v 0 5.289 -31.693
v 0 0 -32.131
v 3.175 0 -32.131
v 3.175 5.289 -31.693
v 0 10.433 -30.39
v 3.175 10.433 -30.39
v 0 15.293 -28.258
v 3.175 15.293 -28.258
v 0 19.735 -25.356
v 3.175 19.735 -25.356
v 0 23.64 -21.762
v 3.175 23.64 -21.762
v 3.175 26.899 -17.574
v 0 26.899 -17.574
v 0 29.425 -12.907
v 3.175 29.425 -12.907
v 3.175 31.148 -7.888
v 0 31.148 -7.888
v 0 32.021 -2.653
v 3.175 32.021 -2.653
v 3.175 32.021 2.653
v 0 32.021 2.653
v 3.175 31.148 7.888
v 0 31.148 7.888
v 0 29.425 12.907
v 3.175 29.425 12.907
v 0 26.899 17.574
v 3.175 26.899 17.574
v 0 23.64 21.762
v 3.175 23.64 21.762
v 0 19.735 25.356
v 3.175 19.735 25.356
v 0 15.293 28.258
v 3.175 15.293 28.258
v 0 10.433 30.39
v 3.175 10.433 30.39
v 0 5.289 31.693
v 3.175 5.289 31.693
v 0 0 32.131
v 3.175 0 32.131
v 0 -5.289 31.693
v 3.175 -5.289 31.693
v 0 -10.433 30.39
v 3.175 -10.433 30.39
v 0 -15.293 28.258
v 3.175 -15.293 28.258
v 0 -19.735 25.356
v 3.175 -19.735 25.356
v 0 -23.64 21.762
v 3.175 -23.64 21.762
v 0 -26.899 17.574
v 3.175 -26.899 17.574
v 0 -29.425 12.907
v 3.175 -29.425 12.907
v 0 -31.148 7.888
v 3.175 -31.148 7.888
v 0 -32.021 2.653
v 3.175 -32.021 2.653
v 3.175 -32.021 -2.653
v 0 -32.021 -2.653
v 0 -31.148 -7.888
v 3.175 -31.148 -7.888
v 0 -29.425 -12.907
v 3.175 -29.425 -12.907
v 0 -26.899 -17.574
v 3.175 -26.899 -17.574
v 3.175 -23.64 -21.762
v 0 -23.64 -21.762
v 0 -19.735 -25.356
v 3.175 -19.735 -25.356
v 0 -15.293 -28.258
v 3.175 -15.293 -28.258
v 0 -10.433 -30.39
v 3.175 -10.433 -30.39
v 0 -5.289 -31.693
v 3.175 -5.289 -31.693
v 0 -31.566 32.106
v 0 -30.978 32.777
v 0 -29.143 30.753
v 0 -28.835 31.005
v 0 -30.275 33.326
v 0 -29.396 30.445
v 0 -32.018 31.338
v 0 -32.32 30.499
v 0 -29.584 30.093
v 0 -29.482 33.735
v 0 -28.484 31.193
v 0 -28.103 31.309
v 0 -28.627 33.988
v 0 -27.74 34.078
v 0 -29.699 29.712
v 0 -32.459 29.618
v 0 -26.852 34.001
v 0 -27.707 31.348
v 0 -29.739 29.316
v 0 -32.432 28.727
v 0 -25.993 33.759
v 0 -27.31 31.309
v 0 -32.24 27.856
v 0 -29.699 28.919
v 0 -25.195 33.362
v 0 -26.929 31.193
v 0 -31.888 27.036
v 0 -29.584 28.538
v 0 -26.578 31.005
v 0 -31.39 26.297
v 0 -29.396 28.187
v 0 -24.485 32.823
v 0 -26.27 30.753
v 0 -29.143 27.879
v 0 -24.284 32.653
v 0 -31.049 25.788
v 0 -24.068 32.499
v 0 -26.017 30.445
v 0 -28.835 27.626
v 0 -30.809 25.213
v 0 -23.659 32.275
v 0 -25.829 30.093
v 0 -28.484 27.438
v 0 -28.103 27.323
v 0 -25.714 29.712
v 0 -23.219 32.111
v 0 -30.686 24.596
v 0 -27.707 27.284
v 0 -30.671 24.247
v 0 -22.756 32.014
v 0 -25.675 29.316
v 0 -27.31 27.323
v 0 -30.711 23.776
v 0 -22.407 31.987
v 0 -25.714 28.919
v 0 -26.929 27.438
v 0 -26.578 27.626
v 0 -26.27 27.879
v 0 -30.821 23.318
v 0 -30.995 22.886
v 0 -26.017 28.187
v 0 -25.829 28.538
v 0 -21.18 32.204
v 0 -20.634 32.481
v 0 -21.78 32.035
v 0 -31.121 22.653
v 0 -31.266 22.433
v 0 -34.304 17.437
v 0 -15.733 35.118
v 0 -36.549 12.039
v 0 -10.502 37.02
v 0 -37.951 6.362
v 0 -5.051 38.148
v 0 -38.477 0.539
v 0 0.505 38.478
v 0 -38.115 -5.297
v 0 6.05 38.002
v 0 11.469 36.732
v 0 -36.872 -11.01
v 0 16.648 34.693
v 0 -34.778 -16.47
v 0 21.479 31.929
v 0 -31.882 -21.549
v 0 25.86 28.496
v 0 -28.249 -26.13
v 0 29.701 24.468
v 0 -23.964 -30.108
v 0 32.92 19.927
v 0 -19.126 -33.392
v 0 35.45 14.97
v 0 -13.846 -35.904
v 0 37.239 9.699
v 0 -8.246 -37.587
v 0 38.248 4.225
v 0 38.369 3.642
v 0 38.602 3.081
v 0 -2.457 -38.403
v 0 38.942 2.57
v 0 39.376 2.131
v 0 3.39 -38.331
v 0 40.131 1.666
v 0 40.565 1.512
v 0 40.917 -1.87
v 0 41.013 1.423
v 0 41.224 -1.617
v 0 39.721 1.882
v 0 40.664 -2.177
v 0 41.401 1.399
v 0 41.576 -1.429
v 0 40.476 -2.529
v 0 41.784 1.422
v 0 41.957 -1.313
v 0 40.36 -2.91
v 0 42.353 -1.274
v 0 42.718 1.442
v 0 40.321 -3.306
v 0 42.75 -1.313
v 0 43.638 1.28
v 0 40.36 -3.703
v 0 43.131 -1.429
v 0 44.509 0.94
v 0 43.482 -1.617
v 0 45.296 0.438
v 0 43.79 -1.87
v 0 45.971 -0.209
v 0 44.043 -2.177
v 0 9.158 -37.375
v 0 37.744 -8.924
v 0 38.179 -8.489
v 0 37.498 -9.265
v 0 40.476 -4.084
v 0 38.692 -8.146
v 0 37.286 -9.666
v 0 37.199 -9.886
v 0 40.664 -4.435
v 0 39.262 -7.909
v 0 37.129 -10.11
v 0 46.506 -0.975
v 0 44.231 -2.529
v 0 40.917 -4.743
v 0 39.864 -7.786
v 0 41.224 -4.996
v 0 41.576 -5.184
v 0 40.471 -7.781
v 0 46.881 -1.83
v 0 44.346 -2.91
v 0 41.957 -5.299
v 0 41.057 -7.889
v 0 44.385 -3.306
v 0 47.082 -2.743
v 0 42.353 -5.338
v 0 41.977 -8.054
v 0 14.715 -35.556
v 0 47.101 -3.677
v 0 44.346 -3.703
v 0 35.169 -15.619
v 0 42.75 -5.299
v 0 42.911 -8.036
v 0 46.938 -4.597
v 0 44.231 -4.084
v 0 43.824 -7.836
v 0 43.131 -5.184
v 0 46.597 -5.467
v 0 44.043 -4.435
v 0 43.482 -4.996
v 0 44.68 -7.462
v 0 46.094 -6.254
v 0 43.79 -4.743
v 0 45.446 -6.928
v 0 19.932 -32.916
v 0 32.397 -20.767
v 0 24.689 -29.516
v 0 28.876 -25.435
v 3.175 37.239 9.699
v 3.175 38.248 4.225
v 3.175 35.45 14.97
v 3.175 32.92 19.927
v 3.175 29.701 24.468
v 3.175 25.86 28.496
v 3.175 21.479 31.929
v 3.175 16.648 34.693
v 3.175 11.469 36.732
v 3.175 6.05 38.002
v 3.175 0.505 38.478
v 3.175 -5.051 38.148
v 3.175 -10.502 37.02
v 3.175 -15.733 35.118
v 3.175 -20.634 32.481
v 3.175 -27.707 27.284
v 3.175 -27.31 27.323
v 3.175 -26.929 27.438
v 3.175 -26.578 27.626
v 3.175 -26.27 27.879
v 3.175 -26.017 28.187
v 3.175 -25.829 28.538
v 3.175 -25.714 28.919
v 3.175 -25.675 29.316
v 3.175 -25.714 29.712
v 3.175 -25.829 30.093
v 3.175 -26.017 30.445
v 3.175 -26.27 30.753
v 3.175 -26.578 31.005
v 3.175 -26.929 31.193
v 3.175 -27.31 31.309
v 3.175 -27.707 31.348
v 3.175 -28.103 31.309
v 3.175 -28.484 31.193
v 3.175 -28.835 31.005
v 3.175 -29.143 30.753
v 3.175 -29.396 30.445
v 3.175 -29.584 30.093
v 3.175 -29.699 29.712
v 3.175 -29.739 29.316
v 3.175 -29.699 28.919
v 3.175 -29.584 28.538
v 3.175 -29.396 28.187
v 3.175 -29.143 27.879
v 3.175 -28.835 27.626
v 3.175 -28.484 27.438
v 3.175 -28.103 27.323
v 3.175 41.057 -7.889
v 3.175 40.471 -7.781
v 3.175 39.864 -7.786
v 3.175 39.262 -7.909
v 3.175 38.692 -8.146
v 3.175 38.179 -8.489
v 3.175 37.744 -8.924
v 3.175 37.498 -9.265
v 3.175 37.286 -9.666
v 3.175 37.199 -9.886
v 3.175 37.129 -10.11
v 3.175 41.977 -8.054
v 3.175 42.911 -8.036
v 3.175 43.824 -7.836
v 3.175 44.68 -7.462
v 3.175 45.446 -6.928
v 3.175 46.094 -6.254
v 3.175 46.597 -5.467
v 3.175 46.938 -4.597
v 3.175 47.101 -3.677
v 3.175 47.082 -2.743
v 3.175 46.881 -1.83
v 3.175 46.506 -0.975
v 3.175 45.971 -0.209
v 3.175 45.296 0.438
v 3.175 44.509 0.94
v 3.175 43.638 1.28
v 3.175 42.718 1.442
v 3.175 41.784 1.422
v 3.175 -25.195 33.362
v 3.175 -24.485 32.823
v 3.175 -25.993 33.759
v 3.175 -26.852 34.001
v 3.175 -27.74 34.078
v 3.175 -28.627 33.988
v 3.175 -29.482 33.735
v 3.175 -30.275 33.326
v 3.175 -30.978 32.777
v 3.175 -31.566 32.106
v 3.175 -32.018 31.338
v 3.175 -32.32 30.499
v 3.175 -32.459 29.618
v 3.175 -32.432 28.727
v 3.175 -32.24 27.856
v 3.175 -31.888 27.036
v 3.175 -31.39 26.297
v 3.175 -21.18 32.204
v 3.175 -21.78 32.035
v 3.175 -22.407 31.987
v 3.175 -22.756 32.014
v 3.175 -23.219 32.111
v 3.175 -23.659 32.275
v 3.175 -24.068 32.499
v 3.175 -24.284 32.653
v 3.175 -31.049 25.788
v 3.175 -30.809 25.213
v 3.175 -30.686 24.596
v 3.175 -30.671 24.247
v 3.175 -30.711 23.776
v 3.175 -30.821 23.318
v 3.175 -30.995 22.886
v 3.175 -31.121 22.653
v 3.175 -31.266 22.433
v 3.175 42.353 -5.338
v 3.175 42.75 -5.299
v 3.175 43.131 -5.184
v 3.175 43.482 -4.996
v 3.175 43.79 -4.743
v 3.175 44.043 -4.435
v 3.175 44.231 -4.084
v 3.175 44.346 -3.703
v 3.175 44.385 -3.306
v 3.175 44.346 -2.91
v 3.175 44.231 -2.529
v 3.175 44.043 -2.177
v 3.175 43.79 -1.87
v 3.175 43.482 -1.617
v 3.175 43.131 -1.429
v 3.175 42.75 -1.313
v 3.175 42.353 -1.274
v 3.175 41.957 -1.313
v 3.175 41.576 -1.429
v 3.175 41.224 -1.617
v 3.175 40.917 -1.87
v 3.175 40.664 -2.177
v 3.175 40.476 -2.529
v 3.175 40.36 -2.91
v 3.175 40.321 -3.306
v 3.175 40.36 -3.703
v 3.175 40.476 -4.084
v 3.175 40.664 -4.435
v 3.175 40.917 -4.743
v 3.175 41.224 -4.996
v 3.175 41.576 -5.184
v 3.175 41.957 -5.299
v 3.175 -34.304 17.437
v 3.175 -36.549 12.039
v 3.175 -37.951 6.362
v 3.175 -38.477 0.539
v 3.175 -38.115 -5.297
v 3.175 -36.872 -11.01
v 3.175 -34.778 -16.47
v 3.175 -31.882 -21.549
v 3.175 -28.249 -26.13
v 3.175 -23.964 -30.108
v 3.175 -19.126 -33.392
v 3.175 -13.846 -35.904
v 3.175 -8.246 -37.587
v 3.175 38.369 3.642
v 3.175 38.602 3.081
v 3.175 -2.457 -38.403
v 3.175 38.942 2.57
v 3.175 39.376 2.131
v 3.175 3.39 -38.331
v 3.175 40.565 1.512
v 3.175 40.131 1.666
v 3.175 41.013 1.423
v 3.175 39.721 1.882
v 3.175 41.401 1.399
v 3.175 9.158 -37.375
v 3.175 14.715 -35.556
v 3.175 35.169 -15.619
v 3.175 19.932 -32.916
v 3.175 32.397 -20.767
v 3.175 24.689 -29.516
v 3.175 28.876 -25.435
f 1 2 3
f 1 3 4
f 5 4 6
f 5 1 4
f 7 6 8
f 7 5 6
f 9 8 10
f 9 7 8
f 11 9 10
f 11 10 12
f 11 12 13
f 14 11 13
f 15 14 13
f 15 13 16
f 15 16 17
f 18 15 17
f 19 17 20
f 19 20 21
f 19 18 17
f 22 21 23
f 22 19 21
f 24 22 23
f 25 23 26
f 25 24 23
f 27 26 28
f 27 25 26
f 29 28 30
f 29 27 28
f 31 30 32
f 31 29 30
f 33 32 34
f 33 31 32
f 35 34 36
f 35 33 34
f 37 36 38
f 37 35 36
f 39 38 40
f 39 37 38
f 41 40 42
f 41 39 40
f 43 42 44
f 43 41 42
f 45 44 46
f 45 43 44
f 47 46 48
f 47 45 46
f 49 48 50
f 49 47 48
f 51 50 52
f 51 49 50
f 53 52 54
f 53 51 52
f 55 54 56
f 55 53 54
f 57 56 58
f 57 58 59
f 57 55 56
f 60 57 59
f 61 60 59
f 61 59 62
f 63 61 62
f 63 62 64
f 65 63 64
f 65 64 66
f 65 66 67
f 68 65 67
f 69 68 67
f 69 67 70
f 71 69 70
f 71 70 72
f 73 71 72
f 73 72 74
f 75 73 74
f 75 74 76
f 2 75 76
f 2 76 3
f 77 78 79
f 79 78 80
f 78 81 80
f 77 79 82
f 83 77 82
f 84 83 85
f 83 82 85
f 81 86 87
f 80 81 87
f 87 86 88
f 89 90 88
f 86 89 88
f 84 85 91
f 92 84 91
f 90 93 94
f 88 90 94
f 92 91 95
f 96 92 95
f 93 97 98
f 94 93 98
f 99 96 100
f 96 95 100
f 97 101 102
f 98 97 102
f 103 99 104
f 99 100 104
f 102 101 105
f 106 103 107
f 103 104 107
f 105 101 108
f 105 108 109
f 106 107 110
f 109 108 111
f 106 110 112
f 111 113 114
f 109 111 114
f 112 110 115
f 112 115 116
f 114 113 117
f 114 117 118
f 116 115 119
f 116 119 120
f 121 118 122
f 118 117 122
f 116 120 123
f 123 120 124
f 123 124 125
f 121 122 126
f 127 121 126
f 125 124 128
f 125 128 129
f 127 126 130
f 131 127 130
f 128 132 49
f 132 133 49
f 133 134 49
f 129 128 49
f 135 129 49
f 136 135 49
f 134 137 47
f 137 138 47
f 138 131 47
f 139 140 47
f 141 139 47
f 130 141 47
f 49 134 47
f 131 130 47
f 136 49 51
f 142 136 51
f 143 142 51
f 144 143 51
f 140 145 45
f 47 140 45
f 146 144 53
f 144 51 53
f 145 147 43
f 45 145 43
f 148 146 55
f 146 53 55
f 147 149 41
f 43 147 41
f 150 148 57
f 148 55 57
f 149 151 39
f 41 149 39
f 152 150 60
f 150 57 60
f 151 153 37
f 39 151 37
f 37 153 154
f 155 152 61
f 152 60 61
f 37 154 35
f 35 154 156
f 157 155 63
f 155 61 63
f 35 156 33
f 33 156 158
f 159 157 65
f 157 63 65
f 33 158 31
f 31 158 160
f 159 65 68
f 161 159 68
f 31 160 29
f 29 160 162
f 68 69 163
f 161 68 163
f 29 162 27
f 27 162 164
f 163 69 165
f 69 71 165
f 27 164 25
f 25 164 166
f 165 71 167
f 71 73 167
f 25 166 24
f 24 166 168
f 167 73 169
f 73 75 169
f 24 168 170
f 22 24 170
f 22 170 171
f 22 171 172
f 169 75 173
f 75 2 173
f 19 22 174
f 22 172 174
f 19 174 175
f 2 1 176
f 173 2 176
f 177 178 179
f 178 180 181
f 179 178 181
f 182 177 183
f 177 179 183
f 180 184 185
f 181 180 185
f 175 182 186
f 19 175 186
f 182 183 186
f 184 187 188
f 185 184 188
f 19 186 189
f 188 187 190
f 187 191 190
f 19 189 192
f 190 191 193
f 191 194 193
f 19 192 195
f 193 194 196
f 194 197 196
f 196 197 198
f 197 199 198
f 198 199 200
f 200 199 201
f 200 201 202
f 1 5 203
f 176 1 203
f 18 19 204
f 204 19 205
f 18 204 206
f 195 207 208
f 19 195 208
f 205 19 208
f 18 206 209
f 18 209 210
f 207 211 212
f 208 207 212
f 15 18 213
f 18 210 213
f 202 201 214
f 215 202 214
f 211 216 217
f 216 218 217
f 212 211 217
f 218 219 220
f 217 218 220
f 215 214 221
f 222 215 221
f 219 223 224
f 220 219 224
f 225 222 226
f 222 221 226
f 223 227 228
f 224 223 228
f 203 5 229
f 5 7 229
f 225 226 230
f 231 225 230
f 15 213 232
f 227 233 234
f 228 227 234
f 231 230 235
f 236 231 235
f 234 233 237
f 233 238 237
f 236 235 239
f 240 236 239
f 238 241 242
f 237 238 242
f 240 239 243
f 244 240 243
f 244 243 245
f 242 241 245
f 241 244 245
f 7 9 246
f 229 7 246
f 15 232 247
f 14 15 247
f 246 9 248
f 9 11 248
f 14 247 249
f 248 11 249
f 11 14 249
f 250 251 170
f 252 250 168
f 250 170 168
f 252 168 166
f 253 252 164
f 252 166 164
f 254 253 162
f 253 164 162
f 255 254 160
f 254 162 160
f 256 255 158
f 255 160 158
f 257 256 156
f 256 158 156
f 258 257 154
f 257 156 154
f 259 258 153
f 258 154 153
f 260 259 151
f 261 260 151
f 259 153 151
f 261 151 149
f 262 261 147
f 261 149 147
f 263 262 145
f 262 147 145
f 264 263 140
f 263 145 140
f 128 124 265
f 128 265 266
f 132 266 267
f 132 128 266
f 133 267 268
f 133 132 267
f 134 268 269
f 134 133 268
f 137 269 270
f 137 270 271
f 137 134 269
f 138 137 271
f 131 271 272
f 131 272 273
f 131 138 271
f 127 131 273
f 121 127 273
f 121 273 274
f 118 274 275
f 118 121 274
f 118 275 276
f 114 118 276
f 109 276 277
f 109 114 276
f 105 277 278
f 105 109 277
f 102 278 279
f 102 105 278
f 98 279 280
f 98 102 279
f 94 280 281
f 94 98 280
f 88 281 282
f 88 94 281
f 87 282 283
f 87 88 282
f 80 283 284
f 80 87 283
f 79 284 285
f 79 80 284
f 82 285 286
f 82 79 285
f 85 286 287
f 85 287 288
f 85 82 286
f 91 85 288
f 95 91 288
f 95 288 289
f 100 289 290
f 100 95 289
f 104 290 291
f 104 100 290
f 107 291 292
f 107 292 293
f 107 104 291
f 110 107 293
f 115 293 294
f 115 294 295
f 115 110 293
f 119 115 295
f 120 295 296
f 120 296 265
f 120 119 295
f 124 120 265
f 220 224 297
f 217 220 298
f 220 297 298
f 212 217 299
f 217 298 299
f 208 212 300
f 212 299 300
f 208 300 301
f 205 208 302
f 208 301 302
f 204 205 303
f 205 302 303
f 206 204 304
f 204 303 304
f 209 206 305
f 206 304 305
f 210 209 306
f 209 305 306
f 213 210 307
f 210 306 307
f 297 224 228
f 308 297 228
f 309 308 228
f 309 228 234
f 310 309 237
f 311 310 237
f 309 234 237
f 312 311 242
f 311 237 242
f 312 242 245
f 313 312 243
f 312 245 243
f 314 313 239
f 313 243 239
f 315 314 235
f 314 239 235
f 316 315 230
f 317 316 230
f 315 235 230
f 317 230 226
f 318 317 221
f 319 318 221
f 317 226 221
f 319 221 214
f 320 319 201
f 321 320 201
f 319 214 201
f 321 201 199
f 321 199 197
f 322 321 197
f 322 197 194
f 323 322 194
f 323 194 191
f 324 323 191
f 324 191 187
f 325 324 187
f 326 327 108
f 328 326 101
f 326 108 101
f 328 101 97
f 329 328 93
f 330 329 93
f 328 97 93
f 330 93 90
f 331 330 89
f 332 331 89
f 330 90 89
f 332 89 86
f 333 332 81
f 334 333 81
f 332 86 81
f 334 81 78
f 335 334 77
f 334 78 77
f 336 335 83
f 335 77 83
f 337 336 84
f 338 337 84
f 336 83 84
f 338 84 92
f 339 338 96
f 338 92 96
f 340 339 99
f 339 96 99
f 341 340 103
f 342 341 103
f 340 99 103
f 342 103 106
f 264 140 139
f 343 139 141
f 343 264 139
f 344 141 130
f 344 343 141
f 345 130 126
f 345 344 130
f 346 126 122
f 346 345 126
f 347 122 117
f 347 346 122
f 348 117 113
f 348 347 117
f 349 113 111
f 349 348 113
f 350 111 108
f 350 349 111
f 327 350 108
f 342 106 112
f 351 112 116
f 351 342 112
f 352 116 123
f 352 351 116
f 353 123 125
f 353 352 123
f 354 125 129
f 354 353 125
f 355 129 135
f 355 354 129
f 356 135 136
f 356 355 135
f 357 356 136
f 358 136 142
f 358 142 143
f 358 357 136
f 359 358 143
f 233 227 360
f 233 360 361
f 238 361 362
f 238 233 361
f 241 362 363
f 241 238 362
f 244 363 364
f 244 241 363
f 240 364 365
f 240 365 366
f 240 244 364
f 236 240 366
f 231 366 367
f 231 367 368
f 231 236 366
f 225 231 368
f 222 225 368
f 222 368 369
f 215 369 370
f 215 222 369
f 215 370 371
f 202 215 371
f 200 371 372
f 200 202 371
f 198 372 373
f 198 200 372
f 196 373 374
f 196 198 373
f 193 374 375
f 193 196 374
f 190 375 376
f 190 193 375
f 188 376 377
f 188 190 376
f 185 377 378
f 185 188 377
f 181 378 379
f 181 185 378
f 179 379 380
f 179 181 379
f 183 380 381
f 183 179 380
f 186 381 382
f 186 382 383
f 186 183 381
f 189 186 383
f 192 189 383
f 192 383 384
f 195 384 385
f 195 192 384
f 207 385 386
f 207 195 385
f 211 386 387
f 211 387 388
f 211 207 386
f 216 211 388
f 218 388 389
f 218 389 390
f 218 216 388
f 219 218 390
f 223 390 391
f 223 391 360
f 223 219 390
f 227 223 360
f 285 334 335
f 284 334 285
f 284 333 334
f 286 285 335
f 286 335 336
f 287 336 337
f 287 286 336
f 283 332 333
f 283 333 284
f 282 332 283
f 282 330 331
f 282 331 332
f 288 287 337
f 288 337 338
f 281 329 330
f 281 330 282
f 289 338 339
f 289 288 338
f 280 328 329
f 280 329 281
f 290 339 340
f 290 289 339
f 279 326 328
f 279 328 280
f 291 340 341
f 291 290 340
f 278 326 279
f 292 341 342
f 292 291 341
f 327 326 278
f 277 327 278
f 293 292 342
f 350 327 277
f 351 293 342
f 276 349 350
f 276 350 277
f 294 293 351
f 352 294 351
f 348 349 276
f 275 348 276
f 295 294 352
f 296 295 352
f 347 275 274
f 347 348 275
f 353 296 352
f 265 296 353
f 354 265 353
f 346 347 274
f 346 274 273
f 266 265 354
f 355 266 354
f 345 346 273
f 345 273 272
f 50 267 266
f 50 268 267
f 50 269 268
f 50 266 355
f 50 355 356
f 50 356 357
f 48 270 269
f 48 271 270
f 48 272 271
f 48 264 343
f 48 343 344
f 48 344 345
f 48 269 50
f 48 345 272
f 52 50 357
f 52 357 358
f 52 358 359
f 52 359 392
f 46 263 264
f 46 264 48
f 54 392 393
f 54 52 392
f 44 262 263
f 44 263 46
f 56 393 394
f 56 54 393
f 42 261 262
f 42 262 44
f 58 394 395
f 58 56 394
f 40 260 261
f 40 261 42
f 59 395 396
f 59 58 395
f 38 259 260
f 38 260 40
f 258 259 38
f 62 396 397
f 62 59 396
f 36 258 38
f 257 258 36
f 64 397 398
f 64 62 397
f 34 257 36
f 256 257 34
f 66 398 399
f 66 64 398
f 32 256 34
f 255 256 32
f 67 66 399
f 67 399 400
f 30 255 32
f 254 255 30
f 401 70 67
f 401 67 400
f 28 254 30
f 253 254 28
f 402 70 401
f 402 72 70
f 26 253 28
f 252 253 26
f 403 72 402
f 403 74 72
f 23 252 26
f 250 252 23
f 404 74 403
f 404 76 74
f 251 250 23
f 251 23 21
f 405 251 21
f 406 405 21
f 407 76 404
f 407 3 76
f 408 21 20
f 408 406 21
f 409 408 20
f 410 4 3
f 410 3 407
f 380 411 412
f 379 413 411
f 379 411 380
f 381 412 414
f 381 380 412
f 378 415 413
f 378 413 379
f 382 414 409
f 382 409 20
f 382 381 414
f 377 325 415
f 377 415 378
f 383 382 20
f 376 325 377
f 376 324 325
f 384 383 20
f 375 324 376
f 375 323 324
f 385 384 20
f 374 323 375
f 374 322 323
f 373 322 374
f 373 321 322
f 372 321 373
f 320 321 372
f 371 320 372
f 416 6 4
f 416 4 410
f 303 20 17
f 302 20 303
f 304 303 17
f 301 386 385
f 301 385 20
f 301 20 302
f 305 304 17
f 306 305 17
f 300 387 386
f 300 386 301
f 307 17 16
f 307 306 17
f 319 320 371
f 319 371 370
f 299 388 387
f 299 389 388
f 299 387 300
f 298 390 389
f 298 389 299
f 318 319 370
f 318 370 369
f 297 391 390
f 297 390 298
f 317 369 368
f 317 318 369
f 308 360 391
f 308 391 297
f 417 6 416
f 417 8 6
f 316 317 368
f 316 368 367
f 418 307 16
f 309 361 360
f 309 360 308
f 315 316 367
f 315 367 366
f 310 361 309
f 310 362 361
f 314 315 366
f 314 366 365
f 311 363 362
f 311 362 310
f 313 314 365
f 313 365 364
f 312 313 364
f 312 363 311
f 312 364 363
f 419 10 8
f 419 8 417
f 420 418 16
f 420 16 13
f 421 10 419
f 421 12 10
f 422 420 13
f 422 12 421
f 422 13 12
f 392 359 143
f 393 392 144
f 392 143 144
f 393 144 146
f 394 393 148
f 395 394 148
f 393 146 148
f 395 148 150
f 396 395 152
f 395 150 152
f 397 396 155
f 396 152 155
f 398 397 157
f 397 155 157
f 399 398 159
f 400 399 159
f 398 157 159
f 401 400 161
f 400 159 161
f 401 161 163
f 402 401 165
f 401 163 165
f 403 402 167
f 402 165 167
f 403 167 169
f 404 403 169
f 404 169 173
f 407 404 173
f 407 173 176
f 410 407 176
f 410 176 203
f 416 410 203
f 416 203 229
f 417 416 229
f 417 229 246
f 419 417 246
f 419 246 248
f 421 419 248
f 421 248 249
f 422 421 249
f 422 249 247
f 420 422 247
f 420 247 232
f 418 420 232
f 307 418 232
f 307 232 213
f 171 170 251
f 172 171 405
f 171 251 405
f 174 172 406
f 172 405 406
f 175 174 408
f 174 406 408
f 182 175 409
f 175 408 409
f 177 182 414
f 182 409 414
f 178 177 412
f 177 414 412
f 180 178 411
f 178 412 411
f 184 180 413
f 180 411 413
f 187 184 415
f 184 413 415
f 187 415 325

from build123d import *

# Parameters (mm, degrees)
SKETCH1_R           = 32.131
SKETCH1_R_2         = 2.032
BOSS_EXTRUDE1_DEPTH = 3.175
FILLET1_R           = 3.175


with BuildPart() as part:
    # Sketch1 → Boss-Extrude1 (new body)
    with BuildSketch(Plane(origin=(0, 0, 0), x_dir=(0, 0, -1), z_dir=(1, 0, 0))):
        with BuildLine():
            ThreePointArc((0.539277511, 38.477221063), (-34.317069018, 17.410517941), (-30.731600023, -23.159363571))
            ThreePointArc((-30.731600023, -23.159363571), (-32.777019562, -30.977797205), (-24.855674027, -29.376569399))
            ThreePointArc((-24.855674027, -29.376569399), (35.104868111, -15.761839864), (5.438477754, 38.094754504))
            ThreePointArc((5.438477754, 38.094754504), (3.677072288, 47.101407959), (0.539277511, 38.477221063))
        make_face()
        Circle(SKETCH1_R, mode=Mode.SUBTRACT)
        with Locations((3.306405321, 42.353354437)):
            Circle(SKETCH1_R_2, mode=Mode.SUBTRACT)
        with Locations((-29.315764749, -27.706540357)):
            Circle(SKETCH1_R_2, mode=Mode.SUBTRACT)
    extrude(amount=BOSS_EXTRUDE1_DEPTH)

    # Fillet1
    fillet1_edges = [part.edges().sort_by_distance(p)[0] for p in [
        (1.5875, -23.159363571, 30.731600023),
        (1.5875, 38.477221063, -0.539277511),
        (1.5875, 38.094754504, -5.438477754),
        (1.5875, -29.376569399, 24.855674027),
    ]]
    fillet(fillet1_edges, radius=FILLET1_R)


solid = part.part
